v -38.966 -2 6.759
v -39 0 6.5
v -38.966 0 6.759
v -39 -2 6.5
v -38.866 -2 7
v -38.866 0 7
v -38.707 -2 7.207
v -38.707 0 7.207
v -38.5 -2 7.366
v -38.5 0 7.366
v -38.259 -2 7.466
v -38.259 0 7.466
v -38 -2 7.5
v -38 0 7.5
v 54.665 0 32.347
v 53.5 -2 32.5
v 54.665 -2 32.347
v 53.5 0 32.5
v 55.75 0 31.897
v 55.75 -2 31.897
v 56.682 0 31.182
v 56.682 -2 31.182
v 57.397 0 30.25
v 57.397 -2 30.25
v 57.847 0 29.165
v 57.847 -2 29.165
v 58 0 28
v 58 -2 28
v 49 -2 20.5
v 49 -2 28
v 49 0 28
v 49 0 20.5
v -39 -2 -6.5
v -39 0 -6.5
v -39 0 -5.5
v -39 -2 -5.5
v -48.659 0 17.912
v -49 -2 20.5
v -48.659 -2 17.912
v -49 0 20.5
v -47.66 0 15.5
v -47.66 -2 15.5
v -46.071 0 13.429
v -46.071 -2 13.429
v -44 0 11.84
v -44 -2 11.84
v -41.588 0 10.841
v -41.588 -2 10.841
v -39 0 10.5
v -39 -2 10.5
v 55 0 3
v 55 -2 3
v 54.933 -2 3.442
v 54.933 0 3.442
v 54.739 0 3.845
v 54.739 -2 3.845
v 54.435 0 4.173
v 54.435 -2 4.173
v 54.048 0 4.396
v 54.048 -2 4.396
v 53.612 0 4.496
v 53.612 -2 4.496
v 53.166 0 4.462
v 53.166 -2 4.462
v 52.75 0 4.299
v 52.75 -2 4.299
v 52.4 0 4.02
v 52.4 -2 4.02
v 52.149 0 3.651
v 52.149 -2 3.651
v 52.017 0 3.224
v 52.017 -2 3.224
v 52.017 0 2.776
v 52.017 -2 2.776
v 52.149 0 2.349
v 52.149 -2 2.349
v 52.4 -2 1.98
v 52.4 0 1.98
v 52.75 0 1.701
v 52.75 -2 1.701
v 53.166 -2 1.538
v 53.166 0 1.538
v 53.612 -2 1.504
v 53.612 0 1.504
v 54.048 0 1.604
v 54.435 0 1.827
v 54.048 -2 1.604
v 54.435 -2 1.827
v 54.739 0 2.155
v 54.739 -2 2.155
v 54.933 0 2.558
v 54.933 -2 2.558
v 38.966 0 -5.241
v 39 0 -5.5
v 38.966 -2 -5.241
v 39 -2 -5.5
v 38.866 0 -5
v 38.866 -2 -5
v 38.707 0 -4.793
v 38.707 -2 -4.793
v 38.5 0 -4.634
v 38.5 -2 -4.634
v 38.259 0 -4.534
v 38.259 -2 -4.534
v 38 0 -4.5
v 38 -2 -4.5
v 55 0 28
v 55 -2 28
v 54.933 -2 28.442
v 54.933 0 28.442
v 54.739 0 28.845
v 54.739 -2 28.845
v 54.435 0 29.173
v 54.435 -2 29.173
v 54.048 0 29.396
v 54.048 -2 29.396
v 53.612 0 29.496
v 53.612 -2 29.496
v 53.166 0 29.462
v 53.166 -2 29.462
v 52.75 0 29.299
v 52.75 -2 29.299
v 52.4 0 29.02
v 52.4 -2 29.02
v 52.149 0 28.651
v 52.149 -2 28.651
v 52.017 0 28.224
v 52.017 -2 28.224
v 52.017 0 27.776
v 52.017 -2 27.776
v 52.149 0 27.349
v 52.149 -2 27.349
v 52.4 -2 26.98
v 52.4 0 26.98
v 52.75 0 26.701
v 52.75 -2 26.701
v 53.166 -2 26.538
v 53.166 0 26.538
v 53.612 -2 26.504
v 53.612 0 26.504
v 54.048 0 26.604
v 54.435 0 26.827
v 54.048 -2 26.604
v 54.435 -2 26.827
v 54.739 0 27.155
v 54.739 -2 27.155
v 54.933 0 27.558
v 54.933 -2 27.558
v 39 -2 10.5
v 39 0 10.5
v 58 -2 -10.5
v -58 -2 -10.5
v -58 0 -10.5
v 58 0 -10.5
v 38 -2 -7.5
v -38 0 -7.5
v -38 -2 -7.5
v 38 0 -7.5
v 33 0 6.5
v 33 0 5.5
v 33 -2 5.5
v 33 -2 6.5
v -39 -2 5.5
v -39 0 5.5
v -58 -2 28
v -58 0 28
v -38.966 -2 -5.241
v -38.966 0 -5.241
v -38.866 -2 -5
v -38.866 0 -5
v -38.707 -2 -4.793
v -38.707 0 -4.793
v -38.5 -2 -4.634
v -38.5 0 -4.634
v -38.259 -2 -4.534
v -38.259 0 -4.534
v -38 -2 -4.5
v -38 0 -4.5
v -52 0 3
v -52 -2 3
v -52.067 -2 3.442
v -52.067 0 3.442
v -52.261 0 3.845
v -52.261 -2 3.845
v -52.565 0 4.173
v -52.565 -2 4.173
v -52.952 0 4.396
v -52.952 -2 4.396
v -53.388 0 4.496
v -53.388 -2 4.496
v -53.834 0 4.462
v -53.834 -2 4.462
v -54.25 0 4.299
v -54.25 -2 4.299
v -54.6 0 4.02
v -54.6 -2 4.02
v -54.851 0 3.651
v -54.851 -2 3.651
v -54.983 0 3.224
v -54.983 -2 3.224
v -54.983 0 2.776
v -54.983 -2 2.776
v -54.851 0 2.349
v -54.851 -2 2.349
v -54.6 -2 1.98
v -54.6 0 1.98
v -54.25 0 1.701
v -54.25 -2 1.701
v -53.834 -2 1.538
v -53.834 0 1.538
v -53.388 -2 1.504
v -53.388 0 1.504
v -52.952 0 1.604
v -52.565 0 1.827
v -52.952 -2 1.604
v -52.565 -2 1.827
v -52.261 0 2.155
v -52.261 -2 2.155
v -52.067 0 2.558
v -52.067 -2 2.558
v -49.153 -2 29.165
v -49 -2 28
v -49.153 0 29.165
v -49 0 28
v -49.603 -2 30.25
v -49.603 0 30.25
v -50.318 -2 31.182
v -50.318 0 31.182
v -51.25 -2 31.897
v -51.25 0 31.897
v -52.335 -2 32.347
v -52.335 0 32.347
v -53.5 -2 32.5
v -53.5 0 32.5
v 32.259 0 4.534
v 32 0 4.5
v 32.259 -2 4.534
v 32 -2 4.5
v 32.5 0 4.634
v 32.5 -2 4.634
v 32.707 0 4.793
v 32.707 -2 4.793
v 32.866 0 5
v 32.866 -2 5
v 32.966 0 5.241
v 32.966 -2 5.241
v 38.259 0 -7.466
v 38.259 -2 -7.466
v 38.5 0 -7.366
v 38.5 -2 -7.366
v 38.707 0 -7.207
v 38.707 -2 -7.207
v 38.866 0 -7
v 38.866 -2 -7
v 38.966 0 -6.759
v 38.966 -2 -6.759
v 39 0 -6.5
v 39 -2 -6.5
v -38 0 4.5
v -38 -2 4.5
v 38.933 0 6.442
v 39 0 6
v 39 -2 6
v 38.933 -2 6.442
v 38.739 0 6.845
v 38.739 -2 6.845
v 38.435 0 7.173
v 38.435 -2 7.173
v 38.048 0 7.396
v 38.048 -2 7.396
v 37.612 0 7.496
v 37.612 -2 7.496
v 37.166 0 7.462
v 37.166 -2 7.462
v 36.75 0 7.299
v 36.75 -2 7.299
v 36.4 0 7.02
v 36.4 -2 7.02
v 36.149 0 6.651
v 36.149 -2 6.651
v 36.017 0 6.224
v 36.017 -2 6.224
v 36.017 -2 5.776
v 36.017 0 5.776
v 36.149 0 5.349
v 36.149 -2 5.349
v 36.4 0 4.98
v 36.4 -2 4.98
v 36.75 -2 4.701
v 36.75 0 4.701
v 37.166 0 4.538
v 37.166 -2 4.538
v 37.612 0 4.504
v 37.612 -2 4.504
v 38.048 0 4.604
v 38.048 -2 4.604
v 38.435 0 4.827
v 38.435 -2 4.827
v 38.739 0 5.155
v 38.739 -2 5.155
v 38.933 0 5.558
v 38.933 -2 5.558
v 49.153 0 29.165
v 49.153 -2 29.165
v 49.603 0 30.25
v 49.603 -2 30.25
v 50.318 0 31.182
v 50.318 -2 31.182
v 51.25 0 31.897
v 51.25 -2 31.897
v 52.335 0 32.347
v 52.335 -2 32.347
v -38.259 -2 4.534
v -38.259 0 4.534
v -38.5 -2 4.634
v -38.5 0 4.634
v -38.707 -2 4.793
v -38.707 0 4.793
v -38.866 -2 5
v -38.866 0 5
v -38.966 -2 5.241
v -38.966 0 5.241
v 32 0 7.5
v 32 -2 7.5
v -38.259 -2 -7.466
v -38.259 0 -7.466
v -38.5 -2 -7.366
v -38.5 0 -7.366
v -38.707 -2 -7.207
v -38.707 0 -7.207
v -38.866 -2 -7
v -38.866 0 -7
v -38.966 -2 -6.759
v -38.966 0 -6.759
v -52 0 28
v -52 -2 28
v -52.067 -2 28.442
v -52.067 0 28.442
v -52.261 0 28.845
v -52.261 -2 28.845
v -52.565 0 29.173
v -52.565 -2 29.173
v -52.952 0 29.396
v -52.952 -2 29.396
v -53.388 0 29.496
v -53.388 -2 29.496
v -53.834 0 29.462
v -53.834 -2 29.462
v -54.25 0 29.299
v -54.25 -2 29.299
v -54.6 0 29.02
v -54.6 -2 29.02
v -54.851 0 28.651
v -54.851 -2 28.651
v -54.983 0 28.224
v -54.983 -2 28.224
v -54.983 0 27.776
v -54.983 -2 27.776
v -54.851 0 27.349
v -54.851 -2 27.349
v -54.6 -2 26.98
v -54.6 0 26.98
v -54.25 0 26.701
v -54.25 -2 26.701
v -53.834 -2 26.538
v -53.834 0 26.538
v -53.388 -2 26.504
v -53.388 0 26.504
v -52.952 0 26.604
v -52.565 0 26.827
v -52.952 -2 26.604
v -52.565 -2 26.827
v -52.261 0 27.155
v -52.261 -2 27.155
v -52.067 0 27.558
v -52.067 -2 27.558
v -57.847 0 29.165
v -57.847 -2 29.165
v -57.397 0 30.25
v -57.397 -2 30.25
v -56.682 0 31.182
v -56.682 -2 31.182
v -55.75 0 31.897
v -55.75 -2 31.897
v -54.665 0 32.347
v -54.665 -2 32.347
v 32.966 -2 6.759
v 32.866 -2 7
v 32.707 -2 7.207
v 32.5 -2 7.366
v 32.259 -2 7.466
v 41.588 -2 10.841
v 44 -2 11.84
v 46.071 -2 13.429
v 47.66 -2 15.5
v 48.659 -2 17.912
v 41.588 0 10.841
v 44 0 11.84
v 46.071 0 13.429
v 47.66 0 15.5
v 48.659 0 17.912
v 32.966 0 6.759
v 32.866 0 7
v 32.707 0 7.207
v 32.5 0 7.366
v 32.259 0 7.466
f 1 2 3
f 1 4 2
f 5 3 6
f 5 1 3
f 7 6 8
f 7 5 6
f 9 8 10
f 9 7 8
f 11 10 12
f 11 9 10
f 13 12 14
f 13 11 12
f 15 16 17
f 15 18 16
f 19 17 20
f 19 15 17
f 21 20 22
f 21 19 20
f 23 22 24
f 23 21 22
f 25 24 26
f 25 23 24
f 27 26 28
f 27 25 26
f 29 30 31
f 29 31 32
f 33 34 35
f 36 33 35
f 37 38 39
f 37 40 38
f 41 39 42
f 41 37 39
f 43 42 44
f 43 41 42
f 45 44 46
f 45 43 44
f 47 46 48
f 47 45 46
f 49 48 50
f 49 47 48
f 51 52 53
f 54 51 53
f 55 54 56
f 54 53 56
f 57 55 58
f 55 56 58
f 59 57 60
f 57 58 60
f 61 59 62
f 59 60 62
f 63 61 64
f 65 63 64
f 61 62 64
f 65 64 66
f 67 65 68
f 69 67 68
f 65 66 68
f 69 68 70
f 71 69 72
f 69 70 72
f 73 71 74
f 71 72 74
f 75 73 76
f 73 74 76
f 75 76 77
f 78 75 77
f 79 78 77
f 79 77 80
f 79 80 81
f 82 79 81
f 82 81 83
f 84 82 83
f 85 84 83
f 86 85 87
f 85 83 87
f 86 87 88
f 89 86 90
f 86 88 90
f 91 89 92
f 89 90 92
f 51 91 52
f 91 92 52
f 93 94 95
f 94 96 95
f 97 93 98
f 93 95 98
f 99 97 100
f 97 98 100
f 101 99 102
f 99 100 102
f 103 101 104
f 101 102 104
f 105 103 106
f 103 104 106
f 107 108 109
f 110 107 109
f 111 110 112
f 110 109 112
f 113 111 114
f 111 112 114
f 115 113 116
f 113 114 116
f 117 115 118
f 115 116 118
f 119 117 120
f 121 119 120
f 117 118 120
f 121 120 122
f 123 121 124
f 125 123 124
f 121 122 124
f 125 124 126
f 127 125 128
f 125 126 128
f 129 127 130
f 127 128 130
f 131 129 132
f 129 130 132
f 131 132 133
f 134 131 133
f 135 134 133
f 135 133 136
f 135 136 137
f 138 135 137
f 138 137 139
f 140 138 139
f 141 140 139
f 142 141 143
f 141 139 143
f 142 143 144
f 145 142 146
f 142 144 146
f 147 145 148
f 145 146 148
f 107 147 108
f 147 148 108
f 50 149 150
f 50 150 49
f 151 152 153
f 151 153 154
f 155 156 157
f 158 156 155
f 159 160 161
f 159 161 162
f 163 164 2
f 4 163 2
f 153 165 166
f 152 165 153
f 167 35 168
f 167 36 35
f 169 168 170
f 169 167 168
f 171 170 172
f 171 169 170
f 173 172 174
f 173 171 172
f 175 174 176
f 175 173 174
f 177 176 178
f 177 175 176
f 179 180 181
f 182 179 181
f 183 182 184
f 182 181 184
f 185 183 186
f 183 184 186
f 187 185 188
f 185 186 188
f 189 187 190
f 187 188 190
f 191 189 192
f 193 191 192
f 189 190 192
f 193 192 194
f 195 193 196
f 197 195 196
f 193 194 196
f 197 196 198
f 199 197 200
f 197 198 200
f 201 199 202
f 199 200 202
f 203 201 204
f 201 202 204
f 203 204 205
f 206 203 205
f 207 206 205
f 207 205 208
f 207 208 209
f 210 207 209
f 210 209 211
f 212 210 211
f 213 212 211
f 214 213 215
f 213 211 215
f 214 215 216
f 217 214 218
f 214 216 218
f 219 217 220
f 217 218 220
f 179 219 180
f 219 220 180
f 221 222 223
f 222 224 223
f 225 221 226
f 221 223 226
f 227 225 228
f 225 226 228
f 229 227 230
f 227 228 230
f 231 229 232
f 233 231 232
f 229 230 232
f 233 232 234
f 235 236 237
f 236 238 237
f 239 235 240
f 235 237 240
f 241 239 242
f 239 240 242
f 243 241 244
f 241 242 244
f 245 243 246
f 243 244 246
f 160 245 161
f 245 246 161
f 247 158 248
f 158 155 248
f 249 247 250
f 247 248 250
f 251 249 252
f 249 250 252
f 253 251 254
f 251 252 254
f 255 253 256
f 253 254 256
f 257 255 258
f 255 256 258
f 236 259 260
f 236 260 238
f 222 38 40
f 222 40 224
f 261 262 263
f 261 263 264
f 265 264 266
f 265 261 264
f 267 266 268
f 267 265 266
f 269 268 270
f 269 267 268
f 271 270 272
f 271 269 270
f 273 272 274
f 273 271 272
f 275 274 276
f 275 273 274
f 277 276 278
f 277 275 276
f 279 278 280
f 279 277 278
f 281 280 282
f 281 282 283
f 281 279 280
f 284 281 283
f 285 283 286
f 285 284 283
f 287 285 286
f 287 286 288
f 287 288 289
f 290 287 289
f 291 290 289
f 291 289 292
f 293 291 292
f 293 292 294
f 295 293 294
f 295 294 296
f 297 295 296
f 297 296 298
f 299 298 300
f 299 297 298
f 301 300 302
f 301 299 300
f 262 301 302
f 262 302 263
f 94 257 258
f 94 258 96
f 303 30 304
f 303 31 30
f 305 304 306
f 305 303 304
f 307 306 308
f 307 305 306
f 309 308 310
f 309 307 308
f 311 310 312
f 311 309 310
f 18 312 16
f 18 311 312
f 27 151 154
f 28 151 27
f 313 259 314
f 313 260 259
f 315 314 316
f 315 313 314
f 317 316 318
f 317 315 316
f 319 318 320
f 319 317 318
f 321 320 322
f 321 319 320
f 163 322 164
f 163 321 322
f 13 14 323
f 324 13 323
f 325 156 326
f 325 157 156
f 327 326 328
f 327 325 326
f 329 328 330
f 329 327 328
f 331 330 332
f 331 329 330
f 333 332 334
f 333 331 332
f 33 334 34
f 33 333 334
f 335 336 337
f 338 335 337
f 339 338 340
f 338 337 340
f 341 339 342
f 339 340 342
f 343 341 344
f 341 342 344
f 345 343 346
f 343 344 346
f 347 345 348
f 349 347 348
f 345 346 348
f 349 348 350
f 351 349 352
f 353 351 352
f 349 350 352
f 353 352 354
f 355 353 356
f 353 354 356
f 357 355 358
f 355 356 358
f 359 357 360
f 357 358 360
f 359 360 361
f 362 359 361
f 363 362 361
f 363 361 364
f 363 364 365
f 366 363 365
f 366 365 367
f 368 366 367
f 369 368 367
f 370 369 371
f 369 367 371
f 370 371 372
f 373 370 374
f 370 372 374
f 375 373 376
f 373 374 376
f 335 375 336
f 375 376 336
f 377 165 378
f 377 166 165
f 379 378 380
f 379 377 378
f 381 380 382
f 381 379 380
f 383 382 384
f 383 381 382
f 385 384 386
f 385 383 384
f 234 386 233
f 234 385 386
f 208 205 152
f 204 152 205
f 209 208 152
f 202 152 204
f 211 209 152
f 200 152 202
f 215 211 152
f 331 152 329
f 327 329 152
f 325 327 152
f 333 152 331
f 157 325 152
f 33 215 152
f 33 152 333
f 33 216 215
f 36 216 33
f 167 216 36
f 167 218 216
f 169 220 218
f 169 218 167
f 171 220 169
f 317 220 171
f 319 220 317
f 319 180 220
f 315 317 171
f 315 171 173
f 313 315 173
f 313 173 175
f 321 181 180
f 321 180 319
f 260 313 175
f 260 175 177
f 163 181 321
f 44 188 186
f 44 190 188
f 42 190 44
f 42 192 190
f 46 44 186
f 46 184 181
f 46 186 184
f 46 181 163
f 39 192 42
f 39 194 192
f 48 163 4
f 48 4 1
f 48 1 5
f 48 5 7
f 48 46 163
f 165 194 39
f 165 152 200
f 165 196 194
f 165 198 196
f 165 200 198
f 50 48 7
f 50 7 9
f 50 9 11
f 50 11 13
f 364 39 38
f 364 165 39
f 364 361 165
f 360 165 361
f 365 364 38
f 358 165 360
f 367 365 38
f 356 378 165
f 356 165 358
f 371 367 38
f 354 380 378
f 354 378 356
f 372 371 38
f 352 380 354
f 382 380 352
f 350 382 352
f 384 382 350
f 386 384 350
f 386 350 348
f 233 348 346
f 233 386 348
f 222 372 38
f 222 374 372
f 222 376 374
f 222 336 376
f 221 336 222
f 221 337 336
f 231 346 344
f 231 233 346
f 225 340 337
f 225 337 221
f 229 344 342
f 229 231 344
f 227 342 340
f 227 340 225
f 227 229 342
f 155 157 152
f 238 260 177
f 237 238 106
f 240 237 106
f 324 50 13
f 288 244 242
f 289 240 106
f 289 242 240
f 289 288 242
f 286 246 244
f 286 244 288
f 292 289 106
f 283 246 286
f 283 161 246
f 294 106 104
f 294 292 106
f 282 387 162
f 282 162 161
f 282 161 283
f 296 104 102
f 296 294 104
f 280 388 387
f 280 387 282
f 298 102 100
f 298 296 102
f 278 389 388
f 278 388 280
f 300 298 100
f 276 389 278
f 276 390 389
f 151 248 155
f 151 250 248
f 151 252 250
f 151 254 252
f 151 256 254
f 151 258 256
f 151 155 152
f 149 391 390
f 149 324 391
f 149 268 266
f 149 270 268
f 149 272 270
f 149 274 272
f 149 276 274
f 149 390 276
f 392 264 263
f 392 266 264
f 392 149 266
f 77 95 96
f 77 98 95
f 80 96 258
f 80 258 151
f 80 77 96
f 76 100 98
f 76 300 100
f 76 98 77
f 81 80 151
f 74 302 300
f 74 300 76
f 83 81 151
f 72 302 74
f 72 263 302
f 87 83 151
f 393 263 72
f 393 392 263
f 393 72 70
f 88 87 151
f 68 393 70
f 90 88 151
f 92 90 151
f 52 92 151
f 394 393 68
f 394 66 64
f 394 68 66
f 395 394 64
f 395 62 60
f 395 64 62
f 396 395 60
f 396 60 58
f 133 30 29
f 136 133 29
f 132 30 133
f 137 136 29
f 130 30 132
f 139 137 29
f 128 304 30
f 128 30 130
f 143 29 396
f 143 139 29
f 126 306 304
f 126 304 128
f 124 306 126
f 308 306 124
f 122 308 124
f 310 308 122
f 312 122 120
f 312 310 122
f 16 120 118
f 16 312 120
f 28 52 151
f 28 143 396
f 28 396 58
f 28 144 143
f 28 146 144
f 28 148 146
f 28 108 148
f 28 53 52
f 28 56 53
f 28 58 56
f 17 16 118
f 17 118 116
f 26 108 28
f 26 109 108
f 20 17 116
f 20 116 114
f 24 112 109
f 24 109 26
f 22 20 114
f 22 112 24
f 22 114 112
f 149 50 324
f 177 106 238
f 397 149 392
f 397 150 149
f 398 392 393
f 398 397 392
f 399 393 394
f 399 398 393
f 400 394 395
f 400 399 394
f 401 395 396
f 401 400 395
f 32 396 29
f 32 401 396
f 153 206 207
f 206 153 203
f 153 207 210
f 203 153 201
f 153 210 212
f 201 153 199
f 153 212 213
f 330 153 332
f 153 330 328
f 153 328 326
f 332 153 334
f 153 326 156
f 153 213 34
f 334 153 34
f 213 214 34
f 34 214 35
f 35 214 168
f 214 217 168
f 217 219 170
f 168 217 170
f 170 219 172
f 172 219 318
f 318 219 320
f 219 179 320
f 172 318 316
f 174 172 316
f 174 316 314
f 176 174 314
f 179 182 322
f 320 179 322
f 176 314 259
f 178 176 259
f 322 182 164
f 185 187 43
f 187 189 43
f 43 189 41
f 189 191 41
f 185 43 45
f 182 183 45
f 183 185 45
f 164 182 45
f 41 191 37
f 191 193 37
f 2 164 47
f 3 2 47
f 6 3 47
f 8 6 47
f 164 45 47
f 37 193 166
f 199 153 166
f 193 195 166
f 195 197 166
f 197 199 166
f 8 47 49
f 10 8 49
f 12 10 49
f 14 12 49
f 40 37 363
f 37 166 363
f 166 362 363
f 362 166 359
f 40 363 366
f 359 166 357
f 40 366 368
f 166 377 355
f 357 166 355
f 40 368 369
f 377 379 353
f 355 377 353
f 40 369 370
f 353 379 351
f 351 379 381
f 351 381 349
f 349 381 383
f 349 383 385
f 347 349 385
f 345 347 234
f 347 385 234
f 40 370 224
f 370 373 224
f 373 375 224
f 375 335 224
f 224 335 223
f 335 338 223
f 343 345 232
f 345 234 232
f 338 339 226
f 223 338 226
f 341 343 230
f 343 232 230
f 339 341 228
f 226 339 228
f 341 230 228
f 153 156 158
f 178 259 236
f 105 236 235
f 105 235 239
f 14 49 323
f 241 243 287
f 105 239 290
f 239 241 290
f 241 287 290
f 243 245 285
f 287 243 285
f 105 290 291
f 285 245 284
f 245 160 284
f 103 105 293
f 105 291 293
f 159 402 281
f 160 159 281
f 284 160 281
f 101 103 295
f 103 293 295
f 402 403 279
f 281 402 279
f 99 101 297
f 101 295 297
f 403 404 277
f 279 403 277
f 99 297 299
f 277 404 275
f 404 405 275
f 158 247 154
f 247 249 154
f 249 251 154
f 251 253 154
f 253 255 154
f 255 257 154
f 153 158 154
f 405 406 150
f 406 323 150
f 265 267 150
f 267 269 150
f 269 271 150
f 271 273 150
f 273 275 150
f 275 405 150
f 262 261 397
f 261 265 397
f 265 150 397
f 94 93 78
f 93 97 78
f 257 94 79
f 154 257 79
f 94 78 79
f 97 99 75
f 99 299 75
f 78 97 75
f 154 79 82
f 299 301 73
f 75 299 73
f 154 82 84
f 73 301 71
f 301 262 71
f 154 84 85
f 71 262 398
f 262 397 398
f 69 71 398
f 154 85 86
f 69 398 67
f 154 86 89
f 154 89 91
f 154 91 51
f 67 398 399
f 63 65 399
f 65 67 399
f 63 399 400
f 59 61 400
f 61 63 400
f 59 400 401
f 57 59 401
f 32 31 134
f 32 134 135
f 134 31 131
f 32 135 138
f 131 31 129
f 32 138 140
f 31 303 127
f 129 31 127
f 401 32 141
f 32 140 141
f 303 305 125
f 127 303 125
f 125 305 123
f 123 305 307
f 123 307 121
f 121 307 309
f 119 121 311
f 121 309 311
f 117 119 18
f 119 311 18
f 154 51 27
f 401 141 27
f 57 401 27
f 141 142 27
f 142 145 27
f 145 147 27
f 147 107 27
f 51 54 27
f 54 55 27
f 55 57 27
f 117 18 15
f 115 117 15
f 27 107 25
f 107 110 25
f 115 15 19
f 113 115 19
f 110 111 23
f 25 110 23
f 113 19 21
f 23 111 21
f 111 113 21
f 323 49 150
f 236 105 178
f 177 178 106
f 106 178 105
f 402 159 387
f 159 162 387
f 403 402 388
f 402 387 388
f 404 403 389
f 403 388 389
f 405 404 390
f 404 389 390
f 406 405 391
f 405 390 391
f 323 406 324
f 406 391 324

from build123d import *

# Parameters (mm, degrees)
F0_W     = 84
F0_H     = 21
F0_W_2   = 78
F0_H_2   = 3
F0_W_3   = 72
F0_R     = 1.5
F1_DEPTH = 2
F2_R     = 1
F3_R     = 1.5
F4_DEPTH = 2
F5_R     = 10
F6_R     = 4.49999


# Not quite as in the source:
# - a fillet or chamfer is up to 0.001 mm smaller than in the source, because OpenCascade refuses the exact size


with BuildPart() as f1:
    # F0 (on Front) → F1 (new body)
    with BuildSketch(Plane.XZ):
        Rectangle(F0_W, F0_H)
        with Locations((0, -6)):
            Rectangle(F0_W_2, F0_H_2, mode=Mode.SUBTRACT)
        with Locations((-3, 6)):
            Rectangle(F0_W_3, F0_H_2, mode=Mode.SUBTRACT)
        with Locations((37.5, 6)):
            Circle(F0_R, mode=Mode.SUBTRACT)
    extrude(amount=F1_DEPTH)

    # F2
    f2_edges = [f1.edges().sort_by_distance(p)[0] for p in [
        (-39, -1, 7.5),
        (-39, -1, -4.5),
        (-39, -1, 4.5),
        (-39, -1, -7.5),
        (33, -1, 7.5),
        (39, -1, -4.5),
        (39, -1, -7.5),
        (33, -1, 4.5),
    ]]
    fillet(f2_edges, radius=F2_R)

    # F3 (on face) → F4 (join)
    with BuildSketch(Plane.XZ.offset(2)):
        Polygon((-42, -10.5), (-42, 0), (-42, 10.5), (-49, 10.5), (-49, 32.5), (-58, 32.5), (-58, -10.5), align=None)
        with Locations((-53.5, 3)):
            Circle(F3_R, mode=Mode.SUBTRACT)
        with Locations((-53.5, 28)):
            Circle(F3_R, mode=Mode.SUBTRACT)
        Polygon((42, 10.5), (42, 0), (42, -10.5), (58, -10.5), (58, 32.5), (49, 32.5), (49, 10.5), align=None)
        with Locations((53.5, 3)):
            Circle(F3_R, mode=Mode.SUBTRACT)
        with Locations((53.5, 28)):
            Circle(F3_R, mode=Mode.SUBTRACT)
    extrude(amount=-F4_DEPTH)

    # F5
    f5_edges = [f1.edges().sort_by_distance(p)[0] for p in [
        (-49, -1, 10.5),
        (49, -1, 10.5),
    ]]
    fillet(f5_edges, radius=F5_R)

    # F6 (radius 4.5 in the source; OpenCascade refuses exactly that, so slightly less here)
    f6_edges = [f1.edges().sort_by_distance(p)[0] for p in [
        (-49, -1, 32.5),
        (-58, -1, 32.5),
        (58, -1, 32.5),
        (49, -1, 32.5),
    ]]
    fillet(f6_edges, radius=F6_R)


solid = f1.part
